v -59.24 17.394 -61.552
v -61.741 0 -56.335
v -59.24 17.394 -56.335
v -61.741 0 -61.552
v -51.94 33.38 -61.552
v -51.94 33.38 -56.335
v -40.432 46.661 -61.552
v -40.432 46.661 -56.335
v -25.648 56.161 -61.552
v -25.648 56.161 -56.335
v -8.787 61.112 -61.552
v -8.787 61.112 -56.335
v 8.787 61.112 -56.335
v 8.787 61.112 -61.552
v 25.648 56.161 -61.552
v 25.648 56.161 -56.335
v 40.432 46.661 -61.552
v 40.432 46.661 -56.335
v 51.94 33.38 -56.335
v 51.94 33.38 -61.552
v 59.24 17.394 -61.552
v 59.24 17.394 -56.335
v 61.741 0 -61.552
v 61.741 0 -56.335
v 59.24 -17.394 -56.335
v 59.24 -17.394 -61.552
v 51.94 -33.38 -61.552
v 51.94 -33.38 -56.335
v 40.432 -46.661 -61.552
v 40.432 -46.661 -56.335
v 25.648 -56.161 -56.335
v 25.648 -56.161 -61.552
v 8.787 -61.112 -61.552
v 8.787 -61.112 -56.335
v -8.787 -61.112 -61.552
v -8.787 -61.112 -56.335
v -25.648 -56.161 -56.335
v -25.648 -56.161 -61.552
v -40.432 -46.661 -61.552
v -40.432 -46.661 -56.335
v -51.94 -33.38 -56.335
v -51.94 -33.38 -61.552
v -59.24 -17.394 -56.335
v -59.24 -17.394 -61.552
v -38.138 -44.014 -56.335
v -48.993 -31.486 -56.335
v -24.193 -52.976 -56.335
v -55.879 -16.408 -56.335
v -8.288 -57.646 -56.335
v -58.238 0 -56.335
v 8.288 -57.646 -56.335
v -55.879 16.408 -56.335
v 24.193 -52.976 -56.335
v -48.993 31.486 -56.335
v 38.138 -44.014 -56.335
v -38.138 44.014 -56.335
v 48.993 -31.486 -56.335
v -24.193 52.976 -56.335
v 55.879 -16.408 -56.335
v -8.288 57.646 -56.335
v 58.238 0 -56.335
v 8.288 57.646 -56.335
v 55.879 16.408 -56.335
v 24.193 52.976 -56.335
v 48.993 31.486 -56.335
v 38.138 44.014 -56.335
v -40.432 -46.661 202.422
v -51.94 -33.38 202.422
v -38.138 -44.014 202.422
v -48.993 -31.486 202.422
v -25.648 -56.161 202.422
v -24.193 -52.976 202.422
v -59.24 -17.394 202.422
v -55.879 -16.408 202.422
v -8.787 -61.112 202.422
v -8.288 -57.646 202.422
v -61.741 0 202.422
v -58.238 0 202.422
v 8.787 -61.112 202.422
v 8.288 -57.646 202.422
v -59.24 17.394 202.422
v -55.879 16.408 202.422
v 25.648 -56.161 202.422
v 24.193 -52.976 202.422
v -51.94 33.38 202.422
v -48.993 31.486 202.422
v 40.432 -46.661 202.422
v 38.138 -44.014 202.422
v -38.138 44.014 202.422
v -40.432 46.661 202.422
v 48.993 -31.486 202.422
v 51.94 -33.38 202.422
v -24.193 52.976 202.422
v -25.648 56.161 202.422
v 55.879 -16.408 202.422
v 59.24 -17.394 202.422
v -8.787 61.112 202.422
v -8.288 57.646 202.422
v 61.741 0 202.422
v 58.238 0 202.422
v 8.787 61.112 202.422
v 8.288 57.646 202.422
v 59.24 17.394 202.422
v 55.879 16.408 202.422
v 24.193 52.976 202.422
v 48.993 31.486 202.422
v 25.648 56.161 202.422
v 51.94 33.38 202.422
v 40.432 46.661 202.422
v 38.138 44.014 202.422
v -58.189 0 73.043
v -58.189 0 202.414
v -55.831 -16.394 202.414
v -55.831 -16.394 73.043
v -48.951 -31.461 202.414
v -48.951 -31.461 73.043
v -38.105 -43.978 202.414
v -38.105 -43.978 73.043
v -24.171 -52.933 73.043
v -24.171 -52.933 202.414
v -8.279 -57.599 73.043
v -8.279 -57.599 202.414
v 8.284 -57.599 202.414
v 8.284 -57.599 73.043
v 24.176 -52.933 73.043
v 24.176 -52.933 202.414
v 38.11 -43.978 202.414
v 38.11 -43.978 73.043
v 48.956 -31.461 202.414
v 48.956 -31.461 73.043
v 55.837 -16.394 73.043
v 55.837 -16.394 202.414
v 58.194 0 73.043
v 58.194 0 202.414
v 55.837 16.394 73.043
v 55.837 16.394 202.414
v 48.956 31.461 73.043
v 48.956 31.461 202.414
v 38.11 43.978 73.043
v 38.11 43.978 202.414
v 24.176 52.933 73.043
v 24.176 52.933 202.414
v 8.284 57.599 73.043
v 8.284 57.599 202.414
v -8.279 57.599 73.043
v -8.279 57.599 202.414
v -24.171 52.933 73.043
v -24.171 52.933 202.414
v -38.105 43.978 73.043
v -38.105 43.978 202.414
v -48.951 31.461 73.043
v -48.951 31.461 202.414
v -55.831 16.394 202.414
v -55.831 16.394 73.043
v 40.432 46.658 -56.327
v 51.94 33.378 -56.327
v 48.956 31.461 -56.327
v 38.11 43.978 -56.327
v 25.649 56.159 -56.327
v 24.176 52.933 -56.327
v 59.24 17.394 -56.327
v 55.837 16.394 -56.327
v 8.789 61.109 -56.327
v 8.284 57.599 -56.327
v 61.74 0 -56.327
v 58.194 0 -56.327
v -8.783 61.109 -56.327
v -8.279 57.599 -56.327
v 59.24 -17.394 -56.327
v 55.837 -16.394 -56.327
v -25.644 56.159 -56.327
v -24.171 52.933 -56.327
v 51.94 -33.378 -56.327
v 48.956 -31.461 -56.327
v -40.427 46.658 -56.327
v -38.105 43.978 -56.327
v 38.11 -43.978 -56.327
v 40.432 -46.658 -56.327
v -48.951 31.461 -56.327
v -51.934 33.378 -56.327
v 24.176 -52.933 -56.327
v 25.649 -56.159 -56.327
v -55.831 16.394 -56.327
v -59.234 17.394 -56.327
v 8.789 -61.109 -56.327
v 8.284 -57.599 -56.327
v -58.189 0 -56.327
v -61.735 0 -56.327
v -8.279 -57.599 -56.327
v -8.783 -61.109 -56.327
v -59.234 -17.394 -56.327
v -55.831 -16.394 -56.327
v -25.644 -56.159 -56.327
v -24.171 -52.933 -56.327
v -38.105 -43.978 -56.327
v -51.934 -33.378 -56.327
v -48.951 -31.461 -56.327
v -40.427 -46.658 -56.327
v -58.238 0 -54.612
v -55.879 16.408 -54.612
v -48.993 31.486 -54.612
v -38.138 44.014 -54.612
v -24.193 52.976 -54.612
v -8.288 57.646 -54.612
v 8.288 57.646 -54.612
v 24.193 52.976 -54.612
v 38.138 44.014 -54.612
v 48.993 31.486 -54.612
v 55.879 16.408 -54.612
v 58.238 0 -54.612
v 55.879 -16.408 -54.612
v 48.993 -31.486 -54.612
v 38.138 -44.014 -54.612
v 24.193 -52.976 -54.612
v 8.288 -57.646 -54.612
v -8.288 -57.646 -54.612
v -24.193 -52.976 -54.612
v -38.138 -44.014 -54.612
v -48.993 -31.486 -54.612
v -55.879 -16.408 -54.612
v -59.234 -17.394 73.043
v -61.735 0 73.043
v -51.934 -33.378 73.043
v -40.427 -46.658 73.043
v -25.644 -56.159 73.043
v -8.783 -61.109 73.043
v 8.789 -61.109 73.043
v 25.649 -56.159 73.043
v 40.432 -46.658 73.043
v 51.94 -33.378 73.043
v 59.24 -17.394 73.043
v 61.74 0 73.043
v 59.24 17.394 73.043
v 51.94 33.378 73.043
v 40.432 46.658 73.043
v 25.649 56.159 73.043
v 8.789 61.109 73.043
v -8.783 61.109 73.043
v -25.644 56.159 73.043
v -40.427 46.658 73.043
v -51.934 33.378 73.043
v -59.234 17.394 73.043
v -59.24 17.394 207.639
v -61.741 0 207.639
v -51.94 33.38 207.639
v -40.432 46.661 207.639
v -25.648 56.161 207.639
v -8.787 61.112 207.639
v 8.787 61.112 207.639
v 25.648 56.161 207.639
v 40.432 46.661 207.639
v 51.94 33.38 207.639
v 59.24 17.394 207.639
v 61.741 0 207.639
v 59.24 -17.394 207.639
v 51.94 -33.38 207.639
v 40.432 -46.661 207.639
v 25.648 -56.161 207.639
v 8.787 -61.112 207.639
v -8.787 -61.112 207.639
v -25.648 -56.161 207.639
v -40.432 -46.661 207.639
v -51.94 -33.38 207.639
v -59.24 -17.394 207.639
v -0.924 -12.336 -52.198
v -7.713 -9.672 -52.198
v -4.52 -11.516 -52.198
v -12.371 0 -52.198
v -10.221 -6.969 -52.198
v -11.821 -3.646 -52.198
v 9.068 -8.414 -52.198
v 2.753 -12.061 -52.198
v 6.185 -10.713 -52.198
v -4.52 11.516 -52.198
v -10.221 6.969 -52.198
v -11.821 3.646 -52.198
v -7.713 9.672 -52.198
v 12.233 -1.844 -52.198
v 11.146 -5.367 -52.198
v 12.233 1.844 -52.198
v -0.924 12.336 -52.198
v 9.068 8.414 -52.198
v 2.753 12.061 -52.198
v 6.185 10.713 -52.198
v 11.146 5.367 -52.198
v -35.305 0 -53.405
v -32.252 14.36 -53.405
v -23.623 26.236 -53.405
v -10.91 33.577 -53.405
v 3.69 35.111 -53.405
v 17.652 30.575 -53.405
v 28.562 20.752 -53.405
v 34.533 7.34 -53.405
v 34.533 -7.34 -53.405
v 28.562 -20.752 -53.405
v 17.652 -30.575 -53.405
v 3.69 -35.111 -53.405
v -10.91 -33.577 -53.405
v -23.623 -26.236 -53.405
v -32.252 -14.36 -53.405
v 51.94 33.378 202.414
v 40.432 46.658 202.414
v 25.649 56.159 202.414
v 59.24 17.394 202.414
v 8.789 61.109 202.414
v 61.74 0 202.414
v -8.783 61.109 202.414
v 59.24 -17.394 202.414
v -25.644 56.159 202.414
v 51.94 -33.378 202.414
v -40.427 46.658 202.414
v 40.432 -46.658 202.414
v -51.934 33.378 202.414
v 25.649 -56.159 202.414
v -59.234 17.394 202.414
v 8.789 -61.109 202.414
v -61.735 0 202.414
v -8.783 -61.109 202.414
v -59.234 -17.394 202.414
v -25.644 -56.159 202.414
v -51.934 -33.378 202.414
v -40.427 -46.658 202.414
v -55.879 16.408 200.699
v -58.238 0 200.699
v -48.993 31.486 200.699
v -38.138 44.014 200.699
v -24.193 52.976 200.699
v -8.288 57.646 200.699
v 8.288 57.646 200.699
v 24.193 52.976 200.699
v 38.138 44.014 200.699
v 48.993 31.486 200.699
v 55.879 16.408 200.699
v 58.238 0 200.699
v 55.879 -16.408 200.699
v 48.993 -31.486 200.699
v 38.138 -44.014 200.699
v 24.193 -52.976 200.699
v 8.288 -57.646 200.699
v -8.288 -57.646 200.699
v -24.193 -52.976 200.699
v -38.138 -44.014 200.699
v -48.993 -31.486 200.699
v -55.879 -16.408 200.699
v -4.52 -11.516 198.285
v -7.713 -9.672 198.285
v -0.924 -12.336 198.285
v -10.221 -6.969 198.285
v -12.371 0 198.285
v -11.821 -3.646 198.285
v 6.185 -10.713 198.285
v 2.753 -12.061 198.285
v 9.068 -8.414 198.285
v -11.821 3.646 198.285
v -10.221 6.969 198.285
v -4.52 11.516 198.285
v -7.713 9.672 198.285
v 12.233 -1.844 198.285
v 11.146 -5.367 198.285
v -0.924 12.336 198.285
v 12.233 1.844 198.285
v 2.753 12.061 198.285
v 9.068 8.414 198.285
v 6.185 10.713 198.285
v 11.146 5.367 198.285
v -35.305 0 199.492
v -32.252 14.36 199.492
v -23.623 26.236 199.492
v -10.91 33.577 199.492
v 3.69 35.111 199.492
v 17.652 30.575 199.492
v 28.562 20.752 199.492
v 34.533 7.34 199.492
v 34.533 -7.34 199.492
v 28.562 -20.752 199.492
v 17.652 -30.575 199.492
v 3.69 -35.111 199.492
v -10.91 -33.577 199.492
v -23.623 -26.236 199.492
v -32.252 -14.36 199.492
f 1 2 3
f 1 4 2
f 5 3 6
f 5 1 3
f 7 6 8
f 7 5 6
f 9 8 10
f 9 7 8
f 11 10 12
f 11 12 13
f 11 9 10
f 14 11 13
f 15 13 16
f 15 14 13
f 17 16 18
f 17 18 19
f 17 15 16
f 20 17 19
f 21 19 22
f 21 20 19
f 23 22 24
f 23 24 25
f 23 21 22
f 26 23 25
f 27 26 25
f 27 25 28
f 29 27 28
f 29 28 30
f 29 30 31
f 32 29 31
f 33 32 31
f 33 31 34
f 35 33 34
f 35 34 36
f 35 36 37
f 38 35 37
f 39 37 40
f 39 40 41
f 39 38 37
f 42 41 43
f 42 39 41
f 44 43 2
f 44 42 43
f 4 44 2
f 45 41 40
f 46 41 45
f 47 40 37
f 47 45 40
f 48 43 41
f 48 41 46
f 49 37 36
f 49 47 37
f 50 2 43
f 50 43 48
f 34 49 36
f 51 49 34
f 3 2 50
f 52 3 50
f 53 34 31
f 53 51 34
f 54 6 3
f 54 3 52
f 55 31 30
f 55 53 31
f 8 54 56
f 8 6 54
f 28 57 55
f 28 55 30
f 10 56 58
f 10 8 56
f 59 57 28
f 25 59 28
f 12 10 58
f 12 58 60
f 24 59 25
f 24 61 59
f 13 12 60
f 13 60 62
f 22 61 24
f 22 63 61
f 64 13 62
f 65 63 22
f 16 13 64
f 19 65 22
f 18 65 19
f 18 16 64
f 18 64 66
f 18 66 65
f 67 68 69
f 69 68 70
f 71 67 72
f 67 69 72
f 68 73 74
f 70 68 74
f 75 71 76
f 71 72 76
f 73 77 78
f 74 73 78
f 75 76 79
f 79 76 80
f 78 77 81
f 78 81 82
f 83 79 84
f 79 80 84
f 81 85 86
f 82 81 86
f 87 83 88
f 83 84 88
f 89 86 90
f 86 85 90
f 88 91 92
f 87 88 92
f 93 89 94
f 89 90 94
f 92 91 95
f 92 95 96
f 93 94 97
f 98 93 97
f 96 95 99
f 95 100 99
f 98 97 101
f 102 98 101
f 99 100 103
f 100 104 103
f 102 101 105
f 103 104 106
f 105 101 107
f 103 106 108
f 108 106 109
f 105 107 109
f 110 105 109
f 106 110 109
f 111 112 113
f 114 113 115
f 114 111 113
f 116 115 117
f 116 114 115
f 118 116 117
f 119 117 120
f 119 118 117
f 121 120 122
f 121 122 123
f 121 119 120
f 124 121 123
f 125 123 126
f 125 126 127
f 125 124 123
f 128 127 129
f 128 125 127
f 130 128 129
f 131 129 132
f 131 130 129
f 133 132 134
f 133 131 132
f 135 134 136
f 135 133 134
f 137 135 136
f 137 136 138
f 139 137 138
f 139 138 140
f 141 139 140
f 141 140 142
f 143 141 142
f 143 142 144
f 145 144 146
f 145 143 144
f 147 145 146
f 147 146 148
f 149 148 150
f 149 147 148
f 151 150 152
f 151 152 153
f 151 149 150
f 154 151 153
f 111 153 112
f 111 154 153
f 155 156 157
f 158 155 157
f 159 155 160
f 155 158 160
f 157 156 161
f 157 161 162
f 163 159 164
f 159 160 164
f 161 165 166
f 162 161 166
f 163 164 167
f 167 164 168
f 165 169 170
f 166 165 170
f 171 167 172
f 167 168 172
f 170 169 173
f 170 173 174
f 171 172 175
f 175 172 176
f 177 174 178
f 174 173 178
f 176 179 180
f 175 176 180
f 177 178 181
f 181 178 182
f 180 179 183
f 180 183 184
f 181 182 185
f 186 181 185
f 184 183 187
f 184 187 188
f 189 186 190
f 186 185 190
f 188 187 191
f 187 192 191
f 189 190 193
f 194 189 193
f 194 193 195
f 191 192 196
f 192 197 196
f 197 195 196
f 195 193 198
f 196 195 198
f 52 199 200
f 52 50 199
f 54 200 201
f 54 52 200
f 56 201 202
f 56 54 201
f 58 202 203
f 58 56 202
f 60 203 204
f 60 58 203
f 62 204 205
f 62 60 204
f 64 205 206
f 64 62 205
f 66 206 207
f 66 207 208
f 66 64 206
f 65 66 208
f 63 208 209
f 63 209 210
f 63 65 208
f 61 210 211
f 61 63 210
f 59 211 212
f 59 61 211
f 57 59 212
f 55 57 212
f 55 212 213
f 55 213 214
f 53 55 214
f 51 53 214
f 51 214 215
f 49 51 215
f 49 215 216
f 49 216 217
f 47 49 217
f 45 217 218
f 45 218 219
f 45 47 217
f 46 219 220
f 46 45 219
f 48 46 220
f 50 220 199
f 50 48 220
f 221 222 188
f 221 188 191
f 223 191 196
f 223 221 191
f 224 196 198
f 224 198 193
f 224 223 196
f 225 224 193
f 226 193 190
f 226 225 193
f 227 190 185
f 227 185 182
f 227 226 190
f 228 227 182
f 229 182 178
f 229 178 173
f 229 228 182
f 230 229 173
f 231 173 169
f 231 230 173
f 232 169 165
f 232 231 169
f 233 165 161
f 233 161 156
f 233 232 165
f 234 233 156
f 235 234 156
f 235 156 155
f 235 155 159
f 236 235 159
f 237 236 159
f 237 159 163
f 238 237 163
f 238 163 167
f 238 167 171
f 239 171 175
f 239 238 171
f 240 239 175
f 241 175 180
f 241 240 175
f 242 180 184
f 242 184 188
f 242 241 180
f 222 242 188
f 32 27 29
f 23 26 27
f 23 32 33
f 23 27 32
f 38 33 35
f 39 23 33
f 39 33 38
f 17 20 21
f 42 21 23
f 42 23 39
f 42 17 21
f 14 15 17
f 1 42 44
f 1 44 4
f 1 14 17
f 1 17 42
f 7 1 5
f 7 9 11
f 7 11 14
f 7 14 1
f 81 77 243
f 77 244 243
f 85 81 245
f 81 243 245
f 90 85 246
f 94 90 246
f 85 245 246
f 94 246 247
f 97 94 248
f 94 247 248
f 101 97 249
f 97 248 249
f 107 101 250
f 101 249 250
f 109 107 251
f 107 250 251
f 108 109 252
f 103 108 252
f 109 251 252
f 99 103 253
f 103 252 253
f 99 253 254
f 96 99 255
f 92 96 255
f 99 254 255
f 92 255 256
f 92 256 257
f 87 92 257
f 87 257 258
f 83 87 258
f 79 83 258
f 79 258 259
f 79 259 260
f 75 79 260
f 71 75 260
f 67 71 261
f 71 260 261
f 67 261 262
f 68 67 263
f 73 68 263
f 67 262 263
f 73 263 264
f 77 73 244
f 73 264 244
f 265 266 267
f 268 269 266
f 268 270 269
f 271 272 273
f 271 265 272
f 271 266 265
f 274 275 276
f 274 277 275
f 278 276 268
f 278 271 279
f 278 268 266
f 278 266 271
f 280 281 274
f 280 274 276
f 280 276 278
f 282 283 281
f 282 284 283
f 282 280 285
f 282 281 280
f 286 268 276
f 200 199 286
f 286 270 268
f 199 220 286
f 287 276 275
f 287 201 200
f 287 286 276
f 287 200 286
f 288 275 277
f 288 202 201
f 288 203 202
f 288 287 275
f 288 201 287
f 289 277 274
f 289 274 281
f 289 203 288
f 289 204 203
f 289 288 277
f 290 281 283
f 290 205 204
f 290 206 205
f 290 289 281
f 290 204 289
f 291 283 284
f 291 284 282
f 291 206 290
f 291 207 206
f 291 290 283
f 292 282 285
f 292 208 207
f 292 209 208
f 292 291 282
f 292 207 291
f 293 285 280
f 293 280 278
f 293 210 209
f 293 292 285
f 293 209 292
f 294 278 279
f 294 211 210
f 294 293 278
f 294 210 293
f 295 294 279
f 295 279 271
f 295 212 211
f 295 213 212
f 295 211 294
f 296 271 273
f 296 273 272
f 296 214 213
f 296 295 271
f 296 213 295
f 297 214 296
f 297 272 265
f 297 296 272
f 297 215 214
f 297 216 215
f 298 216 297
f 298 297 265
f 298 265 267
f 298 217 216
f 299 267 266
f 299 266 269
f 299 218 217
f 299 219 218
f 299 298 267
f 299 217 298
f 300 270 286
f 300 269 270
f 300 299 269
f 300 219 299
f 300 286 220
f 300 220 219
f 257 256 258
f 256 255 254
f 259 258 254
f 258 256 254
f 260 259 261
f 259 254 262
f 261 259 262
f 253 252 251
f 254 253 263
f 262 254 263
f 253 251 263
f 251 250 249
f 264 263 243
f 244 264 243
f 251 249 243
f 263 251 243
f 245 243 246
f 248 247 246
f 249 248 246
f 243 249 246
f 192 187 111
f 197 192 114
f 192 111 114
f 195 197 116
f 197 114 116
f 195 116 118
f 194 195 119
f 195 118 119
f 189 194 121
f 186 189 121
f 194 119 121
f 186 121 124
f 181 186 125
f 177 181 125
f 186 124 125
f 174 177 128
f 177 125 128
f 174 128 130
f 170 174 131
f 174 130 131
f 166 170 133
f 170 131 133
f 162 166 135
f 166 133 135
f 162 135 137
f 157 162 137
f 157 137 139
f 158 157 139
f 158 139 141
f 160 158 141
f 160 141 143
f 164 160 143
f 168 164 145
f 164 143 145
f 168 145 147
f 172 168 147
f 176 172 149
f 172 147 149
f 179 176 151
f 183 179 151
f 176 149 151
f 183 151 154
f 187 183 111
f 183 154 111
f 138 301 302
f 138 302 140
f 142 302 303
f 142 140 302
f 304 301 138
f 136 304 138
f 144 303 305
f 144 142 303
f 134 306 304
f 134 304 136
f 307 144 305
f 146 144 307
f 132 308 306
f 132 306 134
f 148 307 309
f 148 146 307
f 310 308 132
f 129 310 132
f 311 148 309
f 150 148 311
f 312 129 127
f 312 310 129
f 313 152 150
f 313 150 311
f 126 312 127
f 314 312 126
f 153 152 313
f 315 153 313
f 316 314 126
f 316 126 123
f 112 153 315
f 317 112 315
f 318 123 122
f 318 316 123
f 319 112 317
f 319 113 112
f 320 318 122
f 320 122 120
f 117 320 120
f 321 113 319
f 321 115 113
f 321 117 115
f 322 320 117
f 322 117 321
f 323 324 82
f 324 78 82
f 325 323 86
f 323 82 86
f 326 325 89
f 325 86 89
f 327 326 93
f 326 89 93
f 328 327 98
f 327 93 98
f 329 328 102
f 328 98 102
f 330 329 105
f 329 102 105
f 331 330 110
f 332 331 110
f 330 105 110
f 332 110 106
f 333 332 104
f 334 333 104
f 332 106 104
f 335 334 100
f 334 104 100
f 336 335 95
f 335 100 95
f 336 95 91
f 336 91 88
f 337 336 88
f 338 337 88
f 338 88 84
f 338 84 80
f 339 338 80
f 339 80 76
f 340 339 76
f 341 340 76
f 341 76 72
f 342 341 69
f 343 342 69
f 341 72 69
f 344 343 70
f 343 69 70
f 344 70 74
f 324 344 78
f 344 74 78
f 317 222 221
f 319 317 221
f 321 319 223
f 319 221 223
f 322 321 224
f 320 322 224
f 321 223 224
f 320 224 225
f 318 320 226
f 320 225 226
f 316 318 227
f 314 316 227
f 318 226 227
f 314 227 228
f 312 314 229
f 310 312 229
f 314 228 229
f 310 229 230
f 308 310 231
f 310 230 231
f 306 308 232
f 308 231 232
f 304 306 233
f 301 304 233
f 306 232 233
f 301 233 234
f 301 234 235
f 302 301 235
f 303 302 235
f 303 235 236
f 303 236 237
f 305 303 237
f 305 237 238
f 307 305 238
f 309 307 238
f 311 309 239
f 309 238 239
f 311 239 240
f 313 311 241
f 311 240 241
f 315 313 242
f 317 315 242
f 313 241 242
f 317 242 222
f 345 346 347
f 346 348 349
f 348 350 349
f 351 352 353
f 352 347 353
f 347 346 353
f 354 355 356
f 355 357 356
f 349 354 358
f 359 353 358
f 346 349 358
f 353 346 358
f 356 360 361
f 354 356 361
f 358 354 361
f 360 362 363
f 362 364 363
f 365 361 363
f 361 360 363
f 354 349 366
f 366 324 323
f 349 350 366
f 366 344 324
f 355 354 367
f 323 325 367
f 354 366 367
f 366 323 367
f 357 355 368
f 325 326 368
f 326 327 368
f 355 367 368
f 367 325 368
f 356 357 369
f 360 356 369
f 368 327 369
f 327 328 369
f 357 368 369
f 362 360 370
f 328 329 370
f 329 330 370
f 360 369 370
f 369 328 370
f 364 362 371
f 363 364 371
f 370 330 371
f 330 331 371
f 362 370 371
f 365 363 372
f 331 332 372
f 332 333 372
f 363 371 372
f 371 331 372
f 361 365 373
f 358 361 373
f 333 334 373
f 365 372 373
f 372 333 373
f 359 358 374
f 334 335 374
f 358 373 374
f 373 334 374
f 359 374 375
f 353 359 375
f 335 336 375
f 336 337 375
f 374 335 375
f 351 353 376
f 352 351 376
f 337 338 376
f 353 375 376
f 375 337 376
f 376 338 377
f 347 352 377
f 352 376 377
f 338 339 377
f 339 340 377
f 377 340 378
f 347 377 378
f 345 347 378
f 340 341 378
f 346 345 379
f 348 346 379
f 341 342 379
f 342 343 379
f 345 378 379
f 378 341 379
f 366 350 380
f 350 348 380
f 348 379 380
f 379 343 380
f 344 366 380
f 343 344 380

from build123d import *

# Parameters (mm, degrees)
F2_W = 3.5463683307
F2_H = 129.3705441058


with BuildPart() as f1:
    # F0 (on Front) → F1 (revolve)
    with BuildSketch(Plane.XZ):
        Polygon((0, -61.5517236292), (0, -54.612070322), (-58.2384653389, -54.612070322), (-58.2384653389, -56.3352257013), (-61.7407895625, -56.3352257013), (-61.7407895625, -61.5517236292), align=None)
        Polygon((-58.2384653389, -54.612070322), (0, -54.612070322), (0, -52.1982759237), (-12.370692566, -52.1982759237), align=None)
    revolve(axis=Axis((0, 0, -58.0818969756), (0, 0, -1)))


with BuildPart() as f3:
    # F2 (on Front) → F3 (revolve)
    with BuildSketch(Plane.XZ):
        with Locations((-59.9618349224, 8.3581712097)):
            Rectangle(F2_W, F2_H)
    revolve(axis=Axis((0.0027101487, 0, 8.6135864258), (0, 0, 1)))

    # F5: F3 across face


with BuildPart() as f4_1:
    # F4: instance of F1
    add(f1.part.mirror(Plane(origin=(0.0027101487, 0, 73.0434432626), x_dir=(1, 0, 0), z_dir=(0, 0, 1))))


with BuildPart() as f3_1:
    add(f3.part)
    add(f3.part.mirror(Plane(origin=(0.0027101487, 0, 73.0434432626), x_dir=(1, 0, 0), z_dir=(0, 0, 1))))


solid = Compound([f1.part, f4_1.part, f3_1.part])
